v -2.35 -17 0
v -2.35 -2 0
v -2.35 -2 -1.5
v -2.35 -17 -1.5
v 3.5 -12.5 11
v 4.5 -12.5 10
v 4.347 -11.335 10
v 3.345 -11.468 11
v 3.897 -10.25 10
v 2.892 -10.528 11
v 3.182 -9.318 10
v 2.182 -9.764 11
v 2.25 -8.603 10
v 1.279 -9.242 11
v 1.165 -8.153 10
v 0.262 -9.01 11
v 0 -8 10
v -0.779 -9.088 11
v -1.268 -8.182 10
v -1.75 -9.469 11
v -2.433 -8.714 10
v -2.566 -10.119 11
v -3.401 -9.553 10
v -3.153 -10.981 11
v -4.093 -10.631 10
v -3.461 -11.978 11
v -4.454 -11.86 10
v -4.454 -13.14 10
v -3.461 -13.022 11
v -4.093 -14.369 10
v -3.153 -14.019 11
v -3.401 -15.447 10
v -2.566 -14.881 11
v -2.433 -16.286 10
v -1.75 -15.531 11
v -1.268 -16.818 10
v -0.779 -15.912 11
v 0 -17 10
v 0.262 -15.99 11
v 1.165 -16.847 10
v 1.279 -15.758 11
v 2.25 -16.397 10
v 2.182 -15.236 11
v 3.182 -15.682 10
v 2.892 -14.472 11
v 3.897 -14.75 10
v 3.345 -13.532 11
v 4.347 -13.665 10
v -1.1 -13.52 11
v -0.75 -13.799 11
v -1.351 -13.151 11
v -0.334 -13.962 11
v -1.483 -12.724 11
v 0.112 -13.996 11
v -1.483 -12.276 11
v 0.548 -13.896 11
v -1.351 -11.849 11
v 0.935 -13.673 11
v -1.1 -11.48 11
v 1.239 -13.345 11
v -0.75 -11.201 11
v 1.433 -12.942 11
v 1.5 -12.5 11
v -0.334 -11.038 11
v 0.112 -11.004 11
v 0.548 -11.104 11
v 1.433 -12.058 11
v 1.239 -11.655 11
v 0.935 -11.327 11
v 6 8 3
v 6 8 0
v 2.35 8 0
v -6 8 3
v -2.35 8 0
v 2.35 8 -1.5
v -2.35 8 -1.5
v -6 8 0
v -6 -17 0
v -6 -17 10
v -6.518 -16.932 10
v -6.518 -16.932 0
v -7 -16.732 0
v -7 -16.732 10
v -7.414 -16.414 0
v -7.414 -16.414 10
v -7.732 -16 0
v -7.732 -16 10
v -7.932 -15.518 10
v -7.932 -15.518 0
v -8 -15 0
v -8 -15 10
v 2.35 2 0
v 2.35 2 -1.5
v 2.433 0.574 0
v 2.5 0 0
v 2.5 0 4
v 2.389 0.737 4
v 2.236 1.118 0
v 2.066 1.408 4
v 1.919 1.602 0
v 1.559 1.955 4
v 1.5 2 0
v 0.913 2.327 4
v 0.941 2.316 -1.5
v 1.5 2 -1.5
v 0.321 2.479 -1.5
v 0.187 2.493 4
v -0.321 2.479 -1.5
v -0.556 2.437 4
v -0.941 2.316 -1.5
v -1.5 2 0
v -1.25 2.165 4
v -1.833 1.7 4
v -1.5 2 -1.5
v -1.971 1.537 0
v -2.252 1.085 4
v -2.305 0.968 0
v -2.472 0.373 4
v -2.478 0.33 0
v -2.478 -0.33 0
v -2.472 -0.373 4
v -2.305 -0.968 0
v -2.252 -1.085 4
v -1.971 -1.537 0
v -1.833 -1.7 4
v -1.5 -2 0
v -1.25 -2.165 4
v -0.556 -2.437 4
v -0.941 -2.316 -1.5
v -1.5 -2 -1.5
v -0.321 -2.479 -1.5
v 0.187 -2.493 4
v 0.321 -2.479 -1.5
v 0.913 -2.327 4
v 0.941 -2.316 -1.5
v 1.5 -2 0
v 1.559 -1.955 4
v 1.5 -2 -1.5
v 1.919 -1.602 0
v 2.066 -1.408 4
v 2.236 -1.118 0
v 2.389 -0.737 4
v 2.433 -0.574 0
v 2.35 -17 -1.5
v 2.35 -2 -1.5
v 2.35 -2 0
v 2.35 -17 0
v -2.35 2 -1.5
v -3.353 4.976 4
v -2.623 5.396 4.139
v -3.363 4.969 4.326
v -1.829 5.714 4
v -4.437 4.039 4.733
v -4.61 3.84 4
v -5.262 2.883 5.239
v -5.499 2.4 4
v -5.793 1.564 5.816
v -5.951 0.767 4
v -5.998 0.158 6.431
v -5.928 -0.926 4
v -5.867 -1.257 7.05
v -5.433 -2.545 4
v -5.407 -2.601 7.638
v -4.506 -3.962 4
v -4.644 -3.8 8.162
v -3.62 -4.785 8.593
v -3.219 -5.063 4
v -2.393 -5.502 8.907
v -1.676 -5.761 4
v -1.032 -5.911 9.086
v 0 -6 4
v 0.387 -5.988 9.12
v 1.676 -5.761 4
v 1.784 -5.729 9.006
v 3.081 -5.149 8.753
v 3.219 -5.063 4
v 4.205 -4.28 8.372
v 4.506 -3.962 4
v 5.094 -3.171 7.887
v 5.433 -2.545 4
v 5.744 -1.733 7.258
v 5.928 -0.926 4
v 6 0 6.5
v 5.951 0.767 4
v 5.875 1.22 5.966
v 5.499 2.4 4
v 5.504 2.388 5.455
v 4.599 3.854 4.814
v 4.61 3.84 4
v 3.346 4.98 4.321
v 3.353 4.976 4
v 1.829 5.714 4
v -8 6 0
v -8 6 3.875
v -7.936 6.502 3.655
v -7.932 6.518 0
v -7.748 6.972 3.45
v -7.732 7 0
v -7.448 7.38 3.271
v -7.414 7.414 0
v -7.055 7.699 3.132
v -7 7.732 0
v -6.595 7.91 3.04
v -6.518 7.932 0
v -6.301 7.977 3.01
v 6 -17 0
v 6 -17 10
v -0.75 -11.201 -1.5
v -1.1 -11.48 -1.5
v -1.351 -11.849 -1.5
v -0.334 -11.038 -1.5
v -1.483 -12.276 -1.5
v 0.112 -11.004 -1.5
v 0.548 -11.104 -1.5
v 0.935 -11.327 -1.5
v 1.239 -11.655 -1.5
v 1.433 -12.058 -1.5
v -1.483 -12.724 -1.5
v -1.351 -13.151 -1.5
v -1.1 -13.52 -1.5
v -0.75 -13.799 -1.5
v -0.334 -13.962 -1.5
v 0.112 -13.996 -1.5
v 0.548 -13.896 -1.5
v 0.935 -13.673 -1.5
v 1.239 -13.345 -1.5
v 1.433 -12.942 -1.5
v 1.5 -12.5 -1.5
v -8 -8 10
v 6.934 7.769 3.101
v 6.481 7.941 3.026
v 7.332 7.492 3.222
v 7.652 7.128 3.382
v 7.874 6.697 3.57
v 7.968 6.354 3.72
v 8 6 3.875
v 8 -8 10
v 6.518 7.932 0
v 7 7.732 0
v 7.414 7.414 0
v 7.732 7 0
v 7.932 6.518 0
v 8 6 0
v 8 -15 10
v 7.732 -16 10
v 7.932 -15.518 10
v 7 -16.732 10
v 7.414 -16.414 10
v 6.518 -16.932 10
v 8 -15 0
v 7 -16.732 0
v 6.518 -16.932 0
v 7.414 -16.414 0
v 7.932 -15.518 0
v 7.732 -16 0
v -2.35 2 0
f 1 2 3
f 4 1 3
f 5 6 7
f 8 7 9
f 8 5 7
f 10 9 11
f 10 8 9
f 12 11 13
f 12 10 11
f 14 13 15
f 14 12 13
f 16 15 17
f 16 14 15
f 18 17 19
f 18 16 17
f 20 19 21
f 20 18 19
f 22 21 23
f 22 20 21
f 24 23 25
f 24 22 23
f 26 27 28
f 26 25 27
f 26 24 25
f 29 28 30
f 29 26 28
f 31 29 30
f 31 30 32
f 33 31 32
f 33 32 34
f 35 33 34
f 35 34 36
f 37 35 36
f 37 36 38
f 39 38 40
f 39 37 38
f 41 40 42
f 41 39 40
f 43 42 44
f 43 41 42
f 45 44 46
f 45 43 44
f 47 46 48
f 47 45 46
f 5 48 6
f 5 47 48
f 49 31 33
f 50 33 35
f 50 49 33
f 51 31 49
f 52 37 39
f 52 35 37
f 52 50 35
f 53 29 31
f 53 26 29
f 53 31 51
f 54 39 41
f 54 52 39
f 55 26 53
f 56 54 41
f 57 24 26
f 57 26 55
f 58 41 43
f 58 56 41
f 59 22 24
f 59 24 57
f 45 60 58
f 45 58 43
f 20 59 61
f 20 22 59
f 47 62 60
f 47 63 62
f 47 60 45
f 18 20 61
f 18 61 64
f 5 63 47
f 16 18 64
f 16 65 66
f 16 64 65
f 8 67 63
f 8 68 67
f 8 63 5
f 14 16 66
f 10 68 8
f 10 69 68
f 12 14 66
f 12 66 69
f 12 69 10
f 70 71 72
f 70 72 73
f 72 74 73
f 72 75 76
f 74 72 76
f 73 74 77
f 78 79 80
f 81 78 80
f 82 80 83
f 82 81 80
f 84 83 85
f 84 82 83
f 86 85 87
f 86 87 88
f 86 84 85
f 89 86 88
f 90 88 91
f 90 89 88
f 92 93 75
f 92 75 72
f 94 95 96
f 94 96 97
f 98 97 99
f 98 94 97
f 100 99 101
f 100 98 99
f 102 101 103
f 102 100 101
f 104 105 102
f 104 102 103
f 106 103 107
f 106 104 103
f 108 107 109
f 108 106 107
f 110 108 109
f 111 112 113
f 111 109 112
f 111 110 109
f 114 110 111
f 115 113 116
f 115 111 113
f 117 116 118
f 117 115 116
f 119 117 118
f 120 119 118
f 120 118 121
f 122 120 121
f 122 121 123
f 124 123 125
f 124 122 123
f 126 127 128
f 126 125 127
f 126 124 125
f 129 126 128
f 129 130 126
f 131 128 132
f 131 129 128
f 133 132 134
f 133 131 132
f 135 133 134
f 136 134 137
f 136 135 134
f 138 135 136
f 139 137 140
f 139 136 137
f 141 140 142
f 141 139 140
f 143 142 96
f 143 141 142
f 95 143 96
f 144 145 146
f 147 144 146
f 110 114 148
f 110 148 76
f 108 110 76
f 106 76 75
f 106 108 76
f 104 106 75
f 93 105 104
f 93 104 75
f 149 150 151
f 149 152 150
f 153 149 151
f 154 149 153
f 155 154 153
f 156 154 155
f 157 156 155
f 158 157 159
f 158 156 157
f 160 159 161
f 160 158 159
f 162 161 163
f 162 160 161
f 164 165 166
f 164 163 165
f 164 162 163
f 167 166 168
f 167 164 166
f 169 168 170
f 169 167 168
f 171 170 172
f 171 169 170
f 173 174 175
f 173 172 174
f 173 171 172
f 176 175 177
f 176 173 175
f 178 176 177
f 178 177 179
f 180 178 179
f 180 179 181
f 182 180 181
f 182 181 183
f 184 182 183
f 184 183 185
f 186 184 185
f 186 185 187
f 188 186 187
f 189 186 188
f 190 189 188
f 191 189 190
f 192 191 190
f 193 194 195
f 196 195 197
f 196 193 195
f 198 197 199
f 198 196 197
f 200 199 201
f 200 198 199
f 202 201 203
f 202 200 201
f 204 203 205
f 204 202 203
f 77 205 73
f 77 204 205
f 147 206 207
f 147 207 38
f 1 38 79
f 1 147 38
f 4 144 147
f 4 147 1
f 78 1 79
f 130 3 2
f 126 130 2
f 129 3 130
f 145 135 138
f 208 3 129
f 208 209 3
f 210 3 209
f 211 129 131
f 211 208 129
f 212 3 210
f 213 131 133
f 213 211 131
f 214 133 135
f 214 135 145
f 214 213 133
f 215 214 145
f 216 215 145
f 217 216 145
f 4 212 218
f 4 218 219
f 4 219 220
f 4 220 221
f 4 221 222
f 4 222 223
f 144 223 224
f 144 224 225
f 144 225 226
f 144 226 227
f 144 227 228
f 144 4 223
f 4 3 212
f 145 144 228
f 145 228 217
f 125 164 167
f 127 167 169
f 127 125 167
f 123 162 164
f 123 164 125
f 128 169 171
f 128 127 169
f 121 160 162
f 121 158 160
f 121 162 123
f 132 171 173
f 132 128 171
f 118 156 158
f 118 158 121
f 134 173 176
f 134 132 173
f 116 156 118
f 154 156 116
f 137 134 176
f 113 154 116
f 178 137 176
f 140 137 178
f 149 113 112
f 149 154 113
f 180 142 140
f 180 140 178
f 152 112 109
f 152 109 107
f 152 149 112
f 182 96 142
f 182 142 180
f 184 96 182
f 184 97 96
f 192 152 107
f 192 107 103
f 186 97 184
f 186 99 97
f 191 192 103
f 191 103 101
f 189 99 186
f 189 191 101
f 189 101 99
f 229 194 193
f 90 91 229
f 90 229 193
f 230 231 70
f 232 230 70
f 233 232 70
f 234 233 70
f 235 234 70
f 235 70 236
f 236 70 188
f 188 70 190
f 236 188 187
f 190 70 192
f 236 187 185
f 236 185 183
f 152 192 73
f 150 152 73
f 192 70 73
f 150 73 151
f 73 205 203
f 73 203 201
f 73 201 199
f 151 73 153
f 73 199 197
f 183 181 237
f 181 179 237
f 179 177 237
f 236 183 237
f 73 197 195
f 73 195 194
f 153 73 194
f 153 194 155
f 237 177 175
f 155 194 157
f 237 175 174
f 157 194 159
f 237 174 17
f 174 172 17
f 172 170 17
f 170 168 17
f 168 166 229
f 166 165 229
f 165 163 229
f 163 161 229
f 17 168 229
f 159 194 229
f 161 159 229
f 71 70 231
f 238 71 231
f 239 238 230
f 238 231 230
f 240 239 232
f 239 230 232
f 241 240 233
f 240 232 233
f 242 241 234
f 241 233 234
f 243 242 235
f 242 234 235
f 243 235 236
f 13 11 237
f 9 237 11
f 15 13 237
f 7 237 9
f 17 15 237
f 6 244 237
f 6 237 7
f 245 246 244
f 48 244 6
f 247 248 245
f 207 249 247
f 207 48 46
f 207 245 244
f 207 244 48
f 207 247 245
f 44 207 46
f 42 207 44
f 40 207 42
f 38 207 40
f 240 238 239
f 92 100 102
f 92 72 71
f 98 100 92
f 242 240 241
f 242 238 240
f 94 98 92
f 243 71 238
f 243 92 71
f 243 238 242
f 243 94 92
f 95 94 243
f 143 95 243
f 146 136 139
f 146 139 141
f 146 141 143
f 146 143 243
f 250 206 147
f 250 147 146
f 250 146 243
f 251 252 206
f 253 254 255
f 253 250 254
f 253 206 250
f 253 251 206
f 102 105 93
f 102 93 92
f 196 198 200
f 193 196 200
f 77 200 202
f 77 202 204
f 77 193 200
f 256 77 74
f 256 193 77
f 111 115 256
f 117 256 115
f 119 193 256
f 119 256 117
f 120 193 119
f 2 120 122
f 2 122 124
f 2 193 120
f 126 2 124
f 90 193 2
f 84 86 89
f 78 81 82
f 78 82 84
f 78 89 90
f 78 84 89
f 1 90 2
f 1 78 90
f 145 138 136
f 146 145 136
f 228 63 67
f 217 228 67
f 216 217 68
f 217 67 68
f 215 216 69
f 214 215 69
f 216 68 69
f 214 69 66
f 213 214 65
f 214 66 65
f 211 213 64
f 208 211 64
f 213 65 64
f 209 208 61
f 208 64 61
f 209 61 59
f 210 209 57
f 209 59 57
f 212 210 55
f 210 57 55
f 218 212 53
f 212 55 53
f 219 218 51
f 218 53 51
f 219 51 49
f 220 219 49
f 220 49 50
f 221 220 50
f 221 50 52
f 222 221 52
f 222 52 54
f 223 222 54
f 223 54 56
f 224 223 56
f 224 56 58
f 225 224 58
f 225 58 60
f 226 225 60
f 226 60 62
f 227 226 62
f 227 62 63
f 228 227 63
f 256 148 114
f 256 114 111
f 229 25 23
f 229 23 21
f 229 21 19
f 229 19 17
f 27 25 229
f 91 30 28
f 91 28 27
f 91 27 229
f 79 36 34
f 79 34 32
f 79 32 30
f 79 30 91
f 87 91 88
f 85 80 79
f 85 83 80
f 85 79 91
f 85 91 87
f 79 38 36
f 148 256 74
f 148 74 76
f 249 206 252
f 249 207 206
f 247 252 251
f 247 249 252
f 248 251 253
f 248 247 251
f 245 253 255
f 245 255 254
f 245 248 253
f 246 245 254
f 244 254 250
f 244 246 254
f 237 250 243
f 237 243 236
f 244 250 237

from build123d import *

# Parameters (mm, degrees)
BOSS_EXTRU_1_DEPTH           = 8
BOSS_EXTRU_1_DEPTH_BACK      = 17
ENL_V_MAT_EXTRU_1_DEPTH      = 22.836729465
ENL_V_MAT_EXTRU_1_DEPTH_BACK = 22.836729465
ESQUISSE2_R                  = 2.5
ENL_V_START                  = 4
ESQUISSE3_R                  = 6
ENL_V_MAT_EXTRU_2_DEPTH      = 18.283796654
ESQUISSE5_W                  = 1.5
ESQUISSE5_H                  = 4
ENL_V_MAT_EXTRU_3_DEPTH      = 23.273807488
ESQUISSE6_R                  = 4.5
BOSS_EXTRU_2_DEPTH           = 1
BOSS_EXTRU_2_TAPER           = 45
ESQUISSE7_R                  = 1.5
ENL_V_MAT_EXTRU_4_DEPTH      = 23.566568193
CONG_1_R                     = 2
ENL_V_MAT_EXTRU_5_DEPTH      = 26.806975801


with BuildPart() as part:
    # Esquisse1 → Boss.-Extru.1 (new, two sides: drawn at the far end of the back side and taken through both)
    with BuildSketch(Plane(origin=(0, 0, 0), x_dir=(1, 0, 0), z_dir=(0, 1, 0)).offset(-BOSS_EXTRU_1_DEPTH_BACK)):
        Polygon((2.35, 0), (8, 0), (8, -10), (-8, -10), (-8, 0), (-2.35, 0), (-2.35, 1.5), (2.35, 1.5), align=None)
    extrude(amount=BOSS_EXTRU_1_DEPTH + BOSS_EXTRU_1_DEPTH_BACK)

    # Esquisse2 → Enlèv. mat.-Extru.1 (cut, two sides: drawn at the far end of the back side and taken through both)
    with BuildSketch(Plane(origin=(-1.372446517, 0, 0), x_dir=(1, 0, 0), z_dir=(0, 0, 1)).offset(-ENL_V_MAT_EXTRU_1_DEPTH_BACK)):
        with Locations((1.372446517, 0)):
            Circle(ESQUISSE2_R)
    extrude(amount=ENL_V_MAT_EXTRU_1_DEPTH + ENL_V_MAT_EXTRU_1_DEPTH_BACK, mode=Mode.SUBTRACT)

    # Esquisse3 → Enlèv. mat.-Extru.2 (cut, through all)
    with BuildSketch(Plane.XY.offset(ENL_V_START)):
        Circle(ESQUISSE3_R)
    extrude(amount=ENL_V_MAT_EXTRU_2_DEPTH, mode=Mode.SUBTRACT)

    # Esquisse5 → Enlèv. mat.-Extru.3 (cut, through all)
    with BuildSketch(Plane.ZY.offset(2.35)):
        with Locations((-0.75, 0)):
            Rectangle(ESQUISSE5_W, ESQUISSE5_H)
    extrude(amount=-ENL_V_MAT_EXTRU_3_DEPTH, mode=Mode.SUBTRACT)

    # Esquisse6 → Boss.-Extru.2 (add)
    with BuildSketch(Plane.XY.offset(10)):
        with Locations((0, -12.5)):
            Circle(ESQUISSE6_R)
    extrude(amount=BOSS_EXTRU_2_DEPTH, taper=BOSS_EXTRU_2_TAPER)

    # Esquisse7 → Enlèv. mat.-Extru.4 (cut, through all)
    with BuildSketch(Plane.XY.offset(11)):
        with Locations((0, -12.5)):
            Circle(ESQUISSE7_R)
    extrude(amount=-ENL_V_MAT_EXTRU_4_DEPTH, mode=Mode.SUBTRACT)

    # Congé1
    cong_1_edges = [part.edges().sort_by_distance(p)[0] for p in [
        (-8, -17, 5),
        (8, -17, 5),
        (-8, 8, 5),
        (8, 8, 5),
    ]]
    fillet(cong_1_edges, radius=CONG_1_R)

    # Esquisse8 → Enlèv. mat.-Extru.5 (cut, through all)
    with BuildSketch(Plane.ZY.offset(8)):
        Polygon((3, 8), (10, -8), (10, 8), align=None)
    extrude(amount=-ENL_V_MAT_EXTRU_5_DEPTH, mode=Mode.SUBTRACT)


solid = part.part
